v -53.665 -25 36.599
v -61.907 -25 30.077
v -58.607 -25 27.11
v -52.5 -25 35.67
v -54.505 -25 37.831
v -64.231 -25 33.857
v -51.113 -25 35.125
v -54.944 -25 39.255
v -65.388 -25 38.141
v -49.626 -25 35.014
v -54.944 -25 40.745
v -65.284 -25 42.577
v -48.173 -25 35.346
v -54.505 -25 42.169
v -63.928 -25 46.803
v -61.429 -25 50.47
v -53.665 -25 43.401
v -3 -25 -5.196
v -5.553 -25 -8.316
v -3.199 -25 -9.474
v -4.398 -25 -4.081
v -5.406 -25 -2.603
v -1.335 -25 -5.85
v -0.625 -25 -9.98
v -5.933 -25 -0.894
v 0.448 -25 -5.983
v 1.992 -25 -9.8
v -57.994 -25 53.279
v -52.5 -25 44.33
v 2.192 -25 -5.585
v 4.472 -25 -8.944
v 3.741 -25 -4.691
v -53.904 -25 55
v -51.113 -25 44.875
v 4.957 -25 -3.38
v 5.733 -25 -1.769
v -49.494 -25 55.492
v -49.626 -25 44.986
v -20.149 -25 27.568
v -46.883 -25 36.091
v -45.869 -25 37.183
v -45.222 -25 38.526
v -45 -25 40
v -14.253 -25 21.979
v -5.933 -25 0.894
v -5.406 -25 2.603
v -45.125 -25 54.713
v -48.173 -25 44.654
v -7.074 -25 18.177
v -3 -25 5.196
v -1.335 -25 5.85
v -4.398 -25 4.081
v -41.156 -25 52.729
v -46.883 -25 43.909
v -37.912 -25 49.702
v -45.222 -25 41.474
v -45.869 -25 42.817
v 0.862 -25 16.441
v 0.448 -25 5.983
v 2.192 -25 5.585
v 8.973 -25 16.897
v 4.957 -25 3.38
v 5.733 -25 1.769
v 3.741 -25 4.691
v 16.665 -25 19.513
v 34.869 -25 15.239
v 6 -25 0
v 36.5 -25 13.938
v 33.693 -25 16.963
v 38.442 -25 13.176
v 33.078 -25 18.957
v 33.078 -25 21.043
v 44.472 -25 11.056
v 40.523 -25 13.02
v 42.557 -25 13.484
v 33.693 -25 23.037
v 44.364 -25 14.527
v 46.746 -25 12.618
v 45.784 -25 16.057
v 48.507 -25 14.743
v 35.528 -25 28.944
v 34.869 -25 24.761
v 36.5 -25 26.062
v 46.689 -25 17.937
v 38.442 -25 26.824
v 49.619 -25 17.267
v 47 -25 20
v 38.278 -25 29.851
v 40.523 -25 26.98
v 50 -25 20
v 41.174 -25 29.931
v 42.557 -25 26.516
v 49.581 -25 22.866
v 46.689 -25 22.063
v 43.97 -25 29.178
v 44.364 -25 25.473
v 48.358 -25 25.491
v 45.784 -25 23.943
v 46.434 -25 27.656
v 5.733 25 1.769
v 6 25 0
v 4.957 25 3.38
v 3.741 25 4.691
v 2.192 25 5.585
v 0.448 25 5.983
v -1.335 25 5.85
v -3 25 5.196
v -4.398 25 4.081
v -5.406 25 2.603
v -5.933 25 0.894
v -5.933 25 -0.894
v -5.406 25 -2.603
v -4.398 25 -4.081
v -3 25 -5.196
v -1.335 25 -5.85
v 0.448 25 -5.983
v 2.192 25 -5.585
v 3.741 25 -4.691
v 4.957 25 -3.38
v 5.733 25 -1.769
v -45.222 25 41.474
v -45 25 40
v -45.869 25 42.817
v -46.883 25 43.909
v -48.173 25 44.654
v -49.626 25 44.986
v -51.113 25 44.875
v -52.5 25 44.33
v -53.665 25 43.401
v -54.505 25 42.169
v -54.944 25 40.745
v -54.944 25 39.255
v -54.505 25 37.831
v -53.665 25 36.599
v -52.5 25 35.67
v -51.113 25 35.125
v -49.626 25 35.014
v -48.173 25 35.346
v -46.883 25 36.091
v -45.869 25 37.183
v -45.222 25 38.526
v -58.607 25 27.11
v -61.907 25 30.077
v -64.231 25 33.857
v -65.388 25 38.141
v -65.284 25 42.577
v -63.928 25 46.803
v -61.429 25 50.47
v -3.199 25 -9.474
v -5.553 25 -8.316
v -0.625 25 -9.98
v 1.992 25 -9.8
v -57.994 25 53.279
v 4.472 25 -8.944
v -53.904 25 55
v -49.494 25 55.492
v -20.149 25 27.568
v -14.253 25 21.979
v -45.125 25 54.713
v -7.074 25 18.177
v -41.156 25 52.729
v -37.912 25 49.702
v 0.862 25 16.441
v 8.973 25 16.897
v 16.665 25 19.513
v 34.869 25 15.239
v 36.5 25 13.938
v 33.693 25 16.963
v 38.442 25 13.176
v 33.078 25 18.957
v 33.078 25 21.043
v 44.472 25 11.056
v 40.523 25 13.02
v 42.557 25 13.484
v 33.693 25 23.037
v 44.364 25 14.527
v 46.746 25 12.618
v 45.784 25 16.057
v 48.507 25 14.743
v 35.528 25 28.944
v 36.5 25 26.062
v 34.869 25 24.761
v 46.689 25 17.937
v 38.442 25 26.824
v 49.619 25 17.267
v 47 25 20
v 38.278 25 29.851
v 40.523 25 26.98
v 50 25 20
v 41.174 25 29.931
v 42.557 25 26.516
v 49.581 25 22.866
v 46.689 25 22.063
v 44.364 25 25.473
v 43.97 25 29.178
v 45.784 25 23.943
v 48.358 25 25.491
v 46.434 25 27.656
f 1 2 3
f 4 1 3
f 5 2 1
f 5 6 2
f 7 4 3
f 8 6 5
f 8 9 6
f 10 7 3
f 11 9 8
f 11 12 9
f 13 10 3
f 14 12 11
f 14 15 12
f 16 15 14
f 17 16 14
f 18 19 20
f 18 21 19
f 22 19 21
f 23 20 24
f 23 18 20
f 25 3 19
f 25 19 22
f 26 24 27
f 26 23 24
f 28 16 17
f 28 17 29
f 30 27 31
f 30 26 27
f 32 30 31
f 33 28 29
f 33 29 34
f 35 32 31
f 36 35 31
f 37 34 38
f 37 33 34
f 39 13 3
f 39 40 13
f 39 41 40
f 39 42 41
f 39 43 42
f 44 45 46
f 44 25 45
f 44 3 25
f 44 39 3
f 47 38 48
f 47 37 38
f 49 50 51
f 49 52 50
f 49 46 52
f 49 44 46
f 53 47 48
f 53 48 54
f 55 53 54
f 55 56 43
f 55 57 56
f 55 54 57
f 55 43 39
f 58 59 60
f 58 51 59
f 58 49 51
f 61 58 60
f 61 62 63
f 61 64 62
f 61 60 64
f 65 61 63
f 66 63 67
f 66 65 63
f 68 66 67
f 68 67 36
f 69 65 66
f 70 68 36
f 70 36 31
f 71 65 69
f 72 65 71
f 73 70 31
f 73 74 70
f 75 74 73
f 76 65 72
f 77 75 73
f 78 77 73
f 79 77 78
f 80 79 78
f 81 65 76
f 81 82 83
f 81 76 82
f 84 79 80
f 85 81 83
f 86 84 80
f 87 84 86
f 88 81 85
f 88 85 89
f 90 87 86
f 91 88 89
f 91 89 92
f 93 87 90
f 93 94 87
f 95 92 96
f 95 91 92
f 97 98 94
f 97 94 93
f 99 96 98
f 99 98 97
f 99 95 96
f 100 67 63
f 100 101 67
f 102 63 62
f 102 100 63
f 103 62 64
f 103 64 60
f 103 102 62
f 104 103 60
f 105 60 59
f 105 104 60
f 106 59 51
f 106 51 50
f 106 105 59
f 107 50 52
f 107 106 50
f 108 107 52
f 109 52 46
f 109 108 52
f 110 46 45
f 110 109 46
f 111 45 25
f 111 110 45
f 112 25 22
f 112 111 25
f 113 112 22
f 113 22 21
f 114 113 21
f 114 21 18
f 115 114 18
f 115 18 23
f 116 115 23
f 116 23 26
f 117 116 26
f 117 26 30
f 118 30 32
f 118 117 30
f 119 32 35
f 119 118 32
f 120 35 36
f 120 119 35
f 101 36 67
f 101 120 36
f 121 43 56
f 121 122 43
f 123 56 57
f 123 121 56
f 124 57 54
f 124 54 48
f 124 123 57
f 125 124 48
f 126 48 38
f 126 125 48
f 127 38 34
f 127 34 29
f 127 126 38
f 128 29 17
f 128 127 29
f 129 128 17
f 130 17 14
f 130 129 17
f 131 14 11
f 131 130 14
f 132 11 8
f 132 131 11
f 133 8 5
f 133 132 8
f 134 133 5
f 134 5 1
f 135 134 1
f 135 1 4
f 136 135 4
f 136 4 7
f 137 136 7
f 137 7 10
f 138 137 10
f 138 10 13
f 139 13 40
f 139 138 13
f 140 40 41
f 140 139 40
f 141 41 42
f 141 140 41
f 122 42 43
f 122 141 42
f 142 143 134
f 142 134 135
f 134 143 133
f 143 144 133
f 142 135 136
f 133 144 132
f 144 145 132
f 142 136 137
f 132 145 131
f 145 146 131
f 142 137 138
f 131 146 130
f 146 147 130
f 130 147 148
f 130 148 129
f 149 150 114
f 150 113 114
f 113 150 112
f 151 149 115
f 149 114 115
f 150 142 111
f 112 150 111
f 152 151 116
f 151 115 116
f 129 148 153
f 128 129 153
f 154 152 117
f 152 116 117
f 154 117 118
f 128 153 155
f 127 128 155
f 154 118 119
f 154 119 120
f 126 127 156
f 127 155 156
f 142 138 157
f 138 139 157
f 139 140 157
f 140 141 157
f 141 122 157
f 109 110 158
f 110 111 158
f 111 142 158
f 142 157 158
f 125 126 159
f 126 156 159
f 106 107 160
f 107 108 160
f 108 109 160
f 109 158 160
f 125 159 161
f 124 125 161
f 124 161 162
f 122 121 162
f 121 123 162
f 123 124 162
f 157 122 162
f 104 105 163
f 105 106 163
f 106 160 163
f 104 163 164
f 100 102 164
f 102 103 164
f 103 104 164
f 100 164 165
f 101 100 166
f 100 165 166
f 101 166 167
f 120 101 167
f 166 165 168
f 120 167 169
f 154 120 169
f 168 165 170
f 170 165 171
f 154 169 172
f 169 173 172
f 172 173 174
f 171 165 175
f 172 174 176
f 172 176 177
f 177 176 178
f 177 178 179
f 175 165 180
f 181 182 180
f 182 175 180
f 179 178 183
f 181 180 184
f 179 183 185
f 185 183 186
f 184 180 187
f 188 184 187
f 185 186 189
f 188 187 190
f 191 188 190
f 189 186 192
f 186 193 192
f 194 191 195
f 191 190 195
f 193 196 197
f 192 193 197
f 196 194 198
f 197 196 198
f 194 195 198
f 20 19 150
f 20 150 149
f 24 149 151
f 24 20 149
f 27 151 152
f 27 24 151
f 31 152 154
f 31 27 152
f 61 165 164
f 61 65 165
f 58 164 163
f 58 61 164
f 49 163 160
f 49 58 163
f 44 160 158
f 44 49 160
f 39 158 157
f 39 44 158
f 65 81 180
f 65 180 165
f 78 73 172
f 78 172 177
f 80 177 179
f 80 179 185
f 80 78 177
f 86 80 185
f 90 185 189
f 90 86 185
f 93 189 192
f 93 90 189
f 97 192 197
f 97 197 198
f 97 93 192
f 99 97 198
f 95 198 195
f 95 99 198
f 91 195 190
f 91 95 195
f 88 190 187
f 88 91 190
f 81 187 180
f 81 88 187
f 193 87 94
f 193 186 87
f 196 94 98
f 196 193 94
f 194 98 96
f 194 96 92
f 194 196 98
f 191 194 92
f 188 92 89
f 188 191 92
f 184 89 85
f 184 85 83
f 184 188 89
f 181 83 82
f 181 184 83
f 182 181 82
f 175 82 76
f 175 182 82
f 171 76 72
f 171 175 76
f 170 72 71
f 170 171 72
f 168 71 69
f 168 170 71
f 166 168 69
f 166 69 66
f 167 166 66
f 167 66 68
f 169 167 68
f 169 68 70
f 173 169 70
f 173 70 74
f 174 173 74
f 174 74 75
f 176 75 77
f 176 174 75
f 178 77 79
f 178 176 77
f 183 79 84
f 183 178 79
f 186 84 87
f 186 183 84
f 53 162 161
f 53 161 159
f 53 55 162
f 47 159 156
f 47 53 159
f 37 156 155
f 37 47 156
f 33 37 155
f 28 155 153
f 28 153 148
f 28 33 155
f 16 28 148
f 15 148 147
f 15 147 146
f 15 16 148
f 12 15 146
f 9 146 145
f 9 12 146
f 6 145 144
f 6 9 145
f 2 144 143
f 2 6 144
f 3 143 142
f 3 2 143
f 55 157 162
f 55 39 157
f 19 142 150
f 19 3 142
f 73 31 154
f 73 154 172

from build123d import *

# Parameters (mm, degrees)
F0_R     = 5
F0_R_2   = 6
F0_R_3   = 7
F1_DEPTH = 25


with BuildPart() as f1:
    # F0 (on Front) → F1 (new body, symmetric)
    with BuildSketch(Plane.XZ):
        with BuildLine():
            ThreePointArc((-5.553130951, -8.3164136887), (-4.7153308734, 8.8184836993), (10, 0))
            ThreePointArc((10, 0), (8.5065080835, -5.2573111212), (4.472135955, -8.94427191))
            Line((4.472135955, -8.94427191), (44.472135955, 11.05572809))
            ThreePointArc((44.472135955, 11.05572809), (31.05572809, 15.527864045), (35.527864045, 28.94427191))
            Line((35.527864045, 28.94427191), (16.6647048429, 19.512692309))
            ThreePointArc((16.6647048429, 19.512692309), (-3.1646914629, 17.0389630488), (-20.1486854537, 27.5683620073))
            Line((-20.1486854537, 27.5683620073), (-37.911559077, 49.7015254497))
            ThreePointArc((-37.911559077, 49.7015254497), (-35.3777424057, 45.1419434893), (-34.5, 40))
            ThreePointArc((-34.5, 40), (-42.6912371463, 26.3313502661), (-58.607352974, 27.1095587825))
            Line((-58.607352974, 27.1095587825), (-5.553130951, -8.3164136887))
        make_face()
        with BuildLine():
            ThreePointArc((-37.911559077, 49.7015254497), (-61.4292927515, 50.4700175358), (-58.607352974, 27.1095587825))
            ThreePointArc((-58.607352974, 27.1095587825), (-42.6912371463, 26.3313502661), (-34.5, 40))
            ThreePointArc((-34.5, 40), (-35.3777424057, 45.1419434893), (-37.911559077, 49.7015254497))
        make_face()
        with Locations((-50, 40)):
            Circle(F0_R, mode=Mode.SUBTRACT)
        with BuildLine():
            ThreePointArc((4.472135955, -8.94427191), (8.5065080835, -5.2573111212), (10, 0))
            ThreePointArc((10, 0), (-4.7153308734, 8.8184836993), (-5.553130951, -8.3164136887))
            ThreePointArc((-5.553130951, -8.3164136887), (-0.6250512234, -9.9804464313), (4.472135955, -8.94427191))
        make_face()
        Circle(F0_R_2, mode=Mode.SUBTRACT)
        with BuildLine():
            ThreePointArc((35.527864045, 28.94427191), (31.05572809, 15.527864045), (44.472135955, 11.05572809))
            ThreePointArc((44.472135955, 11.05572809), (48.5065080835, 14.7426888788), (50, 20))
            ThreePointArc((50, 20), (45.2573111212, 28.5065080835), (35.527864045, 28.94427191))
        make_face()
        with Locations((40, 20)):
            Circle(F0_R_3, mode=Mode.SUBTRACT)
    extrude(amount=F1_DEPTH, both=True)


solid = f1.part
